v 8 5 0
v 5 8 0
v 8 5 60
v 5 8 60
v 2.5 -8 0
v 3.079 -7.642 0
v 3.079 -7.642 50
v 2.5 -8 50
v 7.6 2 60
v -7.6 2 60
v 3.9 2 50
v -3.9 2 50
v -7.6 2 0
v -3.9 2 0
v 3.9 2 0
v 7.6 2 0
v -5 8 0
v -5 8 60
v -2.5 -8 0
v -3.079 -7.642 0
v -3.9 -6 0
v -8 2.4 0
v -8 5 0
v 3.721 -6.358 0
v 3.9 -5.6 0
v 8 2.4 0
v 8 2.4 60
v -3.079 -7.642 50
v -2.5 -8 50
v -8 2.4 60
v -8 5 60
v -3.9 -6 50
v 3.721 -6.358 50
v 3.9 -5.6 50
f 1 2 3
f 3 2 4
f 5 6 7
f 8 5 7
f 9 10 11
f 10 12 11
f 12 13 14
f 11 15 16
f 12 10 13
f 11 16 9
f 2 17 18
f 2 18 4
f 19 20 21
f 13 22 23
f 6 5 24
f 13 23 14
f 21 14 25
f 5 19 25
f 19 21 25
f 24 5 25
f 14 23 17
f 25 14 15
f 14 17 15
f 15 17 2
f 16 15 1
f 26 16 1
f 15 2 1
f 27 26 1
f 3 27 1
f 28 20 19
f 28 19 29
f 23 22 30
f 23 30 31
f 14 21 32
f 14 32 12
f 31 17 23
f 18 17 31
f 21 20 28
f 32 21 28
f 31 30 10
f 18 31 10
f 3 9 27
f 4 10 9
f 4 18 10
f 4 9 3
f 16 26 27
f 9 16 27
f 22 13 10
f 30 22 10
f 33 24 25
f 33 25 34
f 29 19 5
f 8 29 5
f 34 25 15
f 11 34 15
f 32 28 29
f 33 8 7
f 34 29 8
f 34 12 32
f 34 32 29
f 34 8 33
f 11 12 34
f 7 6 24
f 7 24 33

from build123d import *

# Parameters (mm, degrees)
BOX016_W                 = 16
BOX016_H                 = 6
BOX016_DEPTH             = 60
CHAMFER002001016_SIZE    = 3
BOX017_W                 = 7.8
BOX017_H                 = 10
BOX017_DEPTH             = 50
CHAMFER002001017_1_SIZE2 = 1
CHAMFER002001017_1_SIZE  = 2
CHAMFER002001017_2_SIZE2 = 1
CHAMFER002001017_2_SIZE  = 2
CHAMFER002001018_SIZE    = 0.4


with BuildPart() as chamfer002001016:
    # Box016 → Box016 (new body)
    with BuildSketch(Plane(origin=(-8, 2, 0), x_dir=(1, 0, 0), z_dir=(0, 0, 1))):
        with Locations((8, 3)):
            Rectangle(BOX016_W, BOX016_H)
    extrude(amount=BOX016_DEPTH)

    # Chamfer002001016
    chamfer002001016_edges = [chamfer002001016.edges().sort_by_distance(p)[0] for p in [
        (-8, 8, 30),
        (8, 8, 30),
    ]]
    chamfer(chamfer002001016_edges, length=CHAMFER002001016_SIZE)


with BuildPart() as chamfer002001018:
    # Box017 → Box017 (new body)
    with BuildSketch(Plane(origin=(-3.9, -8, 0), x_dir=(1, 0, 0), z_dir=(0, 0, 1))):
        with Locations((3.9, 5)):
            Rectangle(BOX017_W, BOX017_H)
    extrude(amount=BOX017_DEPTH)

    # Chamfer002001017 1
    chamfer002001017_1_edges = [chamfer002001018.edges().sort_by_distance(p)[0] for p in [
        (3.9, -8, 25),
    ]]
    chamfer002001017_1_side = chamfer002001018.faces().sort_by_distance((3.9, -3, 25))[0]
    chamfer(chamfer002001017_1_edges, length=CHAMFER002001017_1_SIZE, length2=CHAMFER002001017_1_SIZE2, reference=chamfer002001017_1_side)

    # Chamfer002001017 2
    chamfer002001017_2_edges = [chamfer002001018.edges().sort_by_distance(p)[0] for p in [
        (-3.9, -8, 25),
    ]]
    chamfer002001017_2_side = chamfer002001018.faces().sort_by_distance((-3.9, -3, 25))[0]
    chamfer(chamfer002001017_2_edges, length=CHAMFER002001017_2_SIZE, length2=CHAMFER002001017_2_SIZE2, reference=chamfer002001017_2_side)

    # Fusion003012003003: union Chamfer002001016
    add(chamfer002001016.part)

    # Chamfer002001018
    chamfer002001018_edges = [chamfer002001018.edges().sort_by_distance(p)[0] for p in [
        (-8, 2, 30),
        (8, 2, 30),
        (3.9, -6, 25),
        (-2.9, -8, 25),
        (2.9, -8, 25),
    ]]
    chamfer(chamfer002001018_edges, length=CHAMFER002001018_SIZE)


solid = chamfer002001018.part
